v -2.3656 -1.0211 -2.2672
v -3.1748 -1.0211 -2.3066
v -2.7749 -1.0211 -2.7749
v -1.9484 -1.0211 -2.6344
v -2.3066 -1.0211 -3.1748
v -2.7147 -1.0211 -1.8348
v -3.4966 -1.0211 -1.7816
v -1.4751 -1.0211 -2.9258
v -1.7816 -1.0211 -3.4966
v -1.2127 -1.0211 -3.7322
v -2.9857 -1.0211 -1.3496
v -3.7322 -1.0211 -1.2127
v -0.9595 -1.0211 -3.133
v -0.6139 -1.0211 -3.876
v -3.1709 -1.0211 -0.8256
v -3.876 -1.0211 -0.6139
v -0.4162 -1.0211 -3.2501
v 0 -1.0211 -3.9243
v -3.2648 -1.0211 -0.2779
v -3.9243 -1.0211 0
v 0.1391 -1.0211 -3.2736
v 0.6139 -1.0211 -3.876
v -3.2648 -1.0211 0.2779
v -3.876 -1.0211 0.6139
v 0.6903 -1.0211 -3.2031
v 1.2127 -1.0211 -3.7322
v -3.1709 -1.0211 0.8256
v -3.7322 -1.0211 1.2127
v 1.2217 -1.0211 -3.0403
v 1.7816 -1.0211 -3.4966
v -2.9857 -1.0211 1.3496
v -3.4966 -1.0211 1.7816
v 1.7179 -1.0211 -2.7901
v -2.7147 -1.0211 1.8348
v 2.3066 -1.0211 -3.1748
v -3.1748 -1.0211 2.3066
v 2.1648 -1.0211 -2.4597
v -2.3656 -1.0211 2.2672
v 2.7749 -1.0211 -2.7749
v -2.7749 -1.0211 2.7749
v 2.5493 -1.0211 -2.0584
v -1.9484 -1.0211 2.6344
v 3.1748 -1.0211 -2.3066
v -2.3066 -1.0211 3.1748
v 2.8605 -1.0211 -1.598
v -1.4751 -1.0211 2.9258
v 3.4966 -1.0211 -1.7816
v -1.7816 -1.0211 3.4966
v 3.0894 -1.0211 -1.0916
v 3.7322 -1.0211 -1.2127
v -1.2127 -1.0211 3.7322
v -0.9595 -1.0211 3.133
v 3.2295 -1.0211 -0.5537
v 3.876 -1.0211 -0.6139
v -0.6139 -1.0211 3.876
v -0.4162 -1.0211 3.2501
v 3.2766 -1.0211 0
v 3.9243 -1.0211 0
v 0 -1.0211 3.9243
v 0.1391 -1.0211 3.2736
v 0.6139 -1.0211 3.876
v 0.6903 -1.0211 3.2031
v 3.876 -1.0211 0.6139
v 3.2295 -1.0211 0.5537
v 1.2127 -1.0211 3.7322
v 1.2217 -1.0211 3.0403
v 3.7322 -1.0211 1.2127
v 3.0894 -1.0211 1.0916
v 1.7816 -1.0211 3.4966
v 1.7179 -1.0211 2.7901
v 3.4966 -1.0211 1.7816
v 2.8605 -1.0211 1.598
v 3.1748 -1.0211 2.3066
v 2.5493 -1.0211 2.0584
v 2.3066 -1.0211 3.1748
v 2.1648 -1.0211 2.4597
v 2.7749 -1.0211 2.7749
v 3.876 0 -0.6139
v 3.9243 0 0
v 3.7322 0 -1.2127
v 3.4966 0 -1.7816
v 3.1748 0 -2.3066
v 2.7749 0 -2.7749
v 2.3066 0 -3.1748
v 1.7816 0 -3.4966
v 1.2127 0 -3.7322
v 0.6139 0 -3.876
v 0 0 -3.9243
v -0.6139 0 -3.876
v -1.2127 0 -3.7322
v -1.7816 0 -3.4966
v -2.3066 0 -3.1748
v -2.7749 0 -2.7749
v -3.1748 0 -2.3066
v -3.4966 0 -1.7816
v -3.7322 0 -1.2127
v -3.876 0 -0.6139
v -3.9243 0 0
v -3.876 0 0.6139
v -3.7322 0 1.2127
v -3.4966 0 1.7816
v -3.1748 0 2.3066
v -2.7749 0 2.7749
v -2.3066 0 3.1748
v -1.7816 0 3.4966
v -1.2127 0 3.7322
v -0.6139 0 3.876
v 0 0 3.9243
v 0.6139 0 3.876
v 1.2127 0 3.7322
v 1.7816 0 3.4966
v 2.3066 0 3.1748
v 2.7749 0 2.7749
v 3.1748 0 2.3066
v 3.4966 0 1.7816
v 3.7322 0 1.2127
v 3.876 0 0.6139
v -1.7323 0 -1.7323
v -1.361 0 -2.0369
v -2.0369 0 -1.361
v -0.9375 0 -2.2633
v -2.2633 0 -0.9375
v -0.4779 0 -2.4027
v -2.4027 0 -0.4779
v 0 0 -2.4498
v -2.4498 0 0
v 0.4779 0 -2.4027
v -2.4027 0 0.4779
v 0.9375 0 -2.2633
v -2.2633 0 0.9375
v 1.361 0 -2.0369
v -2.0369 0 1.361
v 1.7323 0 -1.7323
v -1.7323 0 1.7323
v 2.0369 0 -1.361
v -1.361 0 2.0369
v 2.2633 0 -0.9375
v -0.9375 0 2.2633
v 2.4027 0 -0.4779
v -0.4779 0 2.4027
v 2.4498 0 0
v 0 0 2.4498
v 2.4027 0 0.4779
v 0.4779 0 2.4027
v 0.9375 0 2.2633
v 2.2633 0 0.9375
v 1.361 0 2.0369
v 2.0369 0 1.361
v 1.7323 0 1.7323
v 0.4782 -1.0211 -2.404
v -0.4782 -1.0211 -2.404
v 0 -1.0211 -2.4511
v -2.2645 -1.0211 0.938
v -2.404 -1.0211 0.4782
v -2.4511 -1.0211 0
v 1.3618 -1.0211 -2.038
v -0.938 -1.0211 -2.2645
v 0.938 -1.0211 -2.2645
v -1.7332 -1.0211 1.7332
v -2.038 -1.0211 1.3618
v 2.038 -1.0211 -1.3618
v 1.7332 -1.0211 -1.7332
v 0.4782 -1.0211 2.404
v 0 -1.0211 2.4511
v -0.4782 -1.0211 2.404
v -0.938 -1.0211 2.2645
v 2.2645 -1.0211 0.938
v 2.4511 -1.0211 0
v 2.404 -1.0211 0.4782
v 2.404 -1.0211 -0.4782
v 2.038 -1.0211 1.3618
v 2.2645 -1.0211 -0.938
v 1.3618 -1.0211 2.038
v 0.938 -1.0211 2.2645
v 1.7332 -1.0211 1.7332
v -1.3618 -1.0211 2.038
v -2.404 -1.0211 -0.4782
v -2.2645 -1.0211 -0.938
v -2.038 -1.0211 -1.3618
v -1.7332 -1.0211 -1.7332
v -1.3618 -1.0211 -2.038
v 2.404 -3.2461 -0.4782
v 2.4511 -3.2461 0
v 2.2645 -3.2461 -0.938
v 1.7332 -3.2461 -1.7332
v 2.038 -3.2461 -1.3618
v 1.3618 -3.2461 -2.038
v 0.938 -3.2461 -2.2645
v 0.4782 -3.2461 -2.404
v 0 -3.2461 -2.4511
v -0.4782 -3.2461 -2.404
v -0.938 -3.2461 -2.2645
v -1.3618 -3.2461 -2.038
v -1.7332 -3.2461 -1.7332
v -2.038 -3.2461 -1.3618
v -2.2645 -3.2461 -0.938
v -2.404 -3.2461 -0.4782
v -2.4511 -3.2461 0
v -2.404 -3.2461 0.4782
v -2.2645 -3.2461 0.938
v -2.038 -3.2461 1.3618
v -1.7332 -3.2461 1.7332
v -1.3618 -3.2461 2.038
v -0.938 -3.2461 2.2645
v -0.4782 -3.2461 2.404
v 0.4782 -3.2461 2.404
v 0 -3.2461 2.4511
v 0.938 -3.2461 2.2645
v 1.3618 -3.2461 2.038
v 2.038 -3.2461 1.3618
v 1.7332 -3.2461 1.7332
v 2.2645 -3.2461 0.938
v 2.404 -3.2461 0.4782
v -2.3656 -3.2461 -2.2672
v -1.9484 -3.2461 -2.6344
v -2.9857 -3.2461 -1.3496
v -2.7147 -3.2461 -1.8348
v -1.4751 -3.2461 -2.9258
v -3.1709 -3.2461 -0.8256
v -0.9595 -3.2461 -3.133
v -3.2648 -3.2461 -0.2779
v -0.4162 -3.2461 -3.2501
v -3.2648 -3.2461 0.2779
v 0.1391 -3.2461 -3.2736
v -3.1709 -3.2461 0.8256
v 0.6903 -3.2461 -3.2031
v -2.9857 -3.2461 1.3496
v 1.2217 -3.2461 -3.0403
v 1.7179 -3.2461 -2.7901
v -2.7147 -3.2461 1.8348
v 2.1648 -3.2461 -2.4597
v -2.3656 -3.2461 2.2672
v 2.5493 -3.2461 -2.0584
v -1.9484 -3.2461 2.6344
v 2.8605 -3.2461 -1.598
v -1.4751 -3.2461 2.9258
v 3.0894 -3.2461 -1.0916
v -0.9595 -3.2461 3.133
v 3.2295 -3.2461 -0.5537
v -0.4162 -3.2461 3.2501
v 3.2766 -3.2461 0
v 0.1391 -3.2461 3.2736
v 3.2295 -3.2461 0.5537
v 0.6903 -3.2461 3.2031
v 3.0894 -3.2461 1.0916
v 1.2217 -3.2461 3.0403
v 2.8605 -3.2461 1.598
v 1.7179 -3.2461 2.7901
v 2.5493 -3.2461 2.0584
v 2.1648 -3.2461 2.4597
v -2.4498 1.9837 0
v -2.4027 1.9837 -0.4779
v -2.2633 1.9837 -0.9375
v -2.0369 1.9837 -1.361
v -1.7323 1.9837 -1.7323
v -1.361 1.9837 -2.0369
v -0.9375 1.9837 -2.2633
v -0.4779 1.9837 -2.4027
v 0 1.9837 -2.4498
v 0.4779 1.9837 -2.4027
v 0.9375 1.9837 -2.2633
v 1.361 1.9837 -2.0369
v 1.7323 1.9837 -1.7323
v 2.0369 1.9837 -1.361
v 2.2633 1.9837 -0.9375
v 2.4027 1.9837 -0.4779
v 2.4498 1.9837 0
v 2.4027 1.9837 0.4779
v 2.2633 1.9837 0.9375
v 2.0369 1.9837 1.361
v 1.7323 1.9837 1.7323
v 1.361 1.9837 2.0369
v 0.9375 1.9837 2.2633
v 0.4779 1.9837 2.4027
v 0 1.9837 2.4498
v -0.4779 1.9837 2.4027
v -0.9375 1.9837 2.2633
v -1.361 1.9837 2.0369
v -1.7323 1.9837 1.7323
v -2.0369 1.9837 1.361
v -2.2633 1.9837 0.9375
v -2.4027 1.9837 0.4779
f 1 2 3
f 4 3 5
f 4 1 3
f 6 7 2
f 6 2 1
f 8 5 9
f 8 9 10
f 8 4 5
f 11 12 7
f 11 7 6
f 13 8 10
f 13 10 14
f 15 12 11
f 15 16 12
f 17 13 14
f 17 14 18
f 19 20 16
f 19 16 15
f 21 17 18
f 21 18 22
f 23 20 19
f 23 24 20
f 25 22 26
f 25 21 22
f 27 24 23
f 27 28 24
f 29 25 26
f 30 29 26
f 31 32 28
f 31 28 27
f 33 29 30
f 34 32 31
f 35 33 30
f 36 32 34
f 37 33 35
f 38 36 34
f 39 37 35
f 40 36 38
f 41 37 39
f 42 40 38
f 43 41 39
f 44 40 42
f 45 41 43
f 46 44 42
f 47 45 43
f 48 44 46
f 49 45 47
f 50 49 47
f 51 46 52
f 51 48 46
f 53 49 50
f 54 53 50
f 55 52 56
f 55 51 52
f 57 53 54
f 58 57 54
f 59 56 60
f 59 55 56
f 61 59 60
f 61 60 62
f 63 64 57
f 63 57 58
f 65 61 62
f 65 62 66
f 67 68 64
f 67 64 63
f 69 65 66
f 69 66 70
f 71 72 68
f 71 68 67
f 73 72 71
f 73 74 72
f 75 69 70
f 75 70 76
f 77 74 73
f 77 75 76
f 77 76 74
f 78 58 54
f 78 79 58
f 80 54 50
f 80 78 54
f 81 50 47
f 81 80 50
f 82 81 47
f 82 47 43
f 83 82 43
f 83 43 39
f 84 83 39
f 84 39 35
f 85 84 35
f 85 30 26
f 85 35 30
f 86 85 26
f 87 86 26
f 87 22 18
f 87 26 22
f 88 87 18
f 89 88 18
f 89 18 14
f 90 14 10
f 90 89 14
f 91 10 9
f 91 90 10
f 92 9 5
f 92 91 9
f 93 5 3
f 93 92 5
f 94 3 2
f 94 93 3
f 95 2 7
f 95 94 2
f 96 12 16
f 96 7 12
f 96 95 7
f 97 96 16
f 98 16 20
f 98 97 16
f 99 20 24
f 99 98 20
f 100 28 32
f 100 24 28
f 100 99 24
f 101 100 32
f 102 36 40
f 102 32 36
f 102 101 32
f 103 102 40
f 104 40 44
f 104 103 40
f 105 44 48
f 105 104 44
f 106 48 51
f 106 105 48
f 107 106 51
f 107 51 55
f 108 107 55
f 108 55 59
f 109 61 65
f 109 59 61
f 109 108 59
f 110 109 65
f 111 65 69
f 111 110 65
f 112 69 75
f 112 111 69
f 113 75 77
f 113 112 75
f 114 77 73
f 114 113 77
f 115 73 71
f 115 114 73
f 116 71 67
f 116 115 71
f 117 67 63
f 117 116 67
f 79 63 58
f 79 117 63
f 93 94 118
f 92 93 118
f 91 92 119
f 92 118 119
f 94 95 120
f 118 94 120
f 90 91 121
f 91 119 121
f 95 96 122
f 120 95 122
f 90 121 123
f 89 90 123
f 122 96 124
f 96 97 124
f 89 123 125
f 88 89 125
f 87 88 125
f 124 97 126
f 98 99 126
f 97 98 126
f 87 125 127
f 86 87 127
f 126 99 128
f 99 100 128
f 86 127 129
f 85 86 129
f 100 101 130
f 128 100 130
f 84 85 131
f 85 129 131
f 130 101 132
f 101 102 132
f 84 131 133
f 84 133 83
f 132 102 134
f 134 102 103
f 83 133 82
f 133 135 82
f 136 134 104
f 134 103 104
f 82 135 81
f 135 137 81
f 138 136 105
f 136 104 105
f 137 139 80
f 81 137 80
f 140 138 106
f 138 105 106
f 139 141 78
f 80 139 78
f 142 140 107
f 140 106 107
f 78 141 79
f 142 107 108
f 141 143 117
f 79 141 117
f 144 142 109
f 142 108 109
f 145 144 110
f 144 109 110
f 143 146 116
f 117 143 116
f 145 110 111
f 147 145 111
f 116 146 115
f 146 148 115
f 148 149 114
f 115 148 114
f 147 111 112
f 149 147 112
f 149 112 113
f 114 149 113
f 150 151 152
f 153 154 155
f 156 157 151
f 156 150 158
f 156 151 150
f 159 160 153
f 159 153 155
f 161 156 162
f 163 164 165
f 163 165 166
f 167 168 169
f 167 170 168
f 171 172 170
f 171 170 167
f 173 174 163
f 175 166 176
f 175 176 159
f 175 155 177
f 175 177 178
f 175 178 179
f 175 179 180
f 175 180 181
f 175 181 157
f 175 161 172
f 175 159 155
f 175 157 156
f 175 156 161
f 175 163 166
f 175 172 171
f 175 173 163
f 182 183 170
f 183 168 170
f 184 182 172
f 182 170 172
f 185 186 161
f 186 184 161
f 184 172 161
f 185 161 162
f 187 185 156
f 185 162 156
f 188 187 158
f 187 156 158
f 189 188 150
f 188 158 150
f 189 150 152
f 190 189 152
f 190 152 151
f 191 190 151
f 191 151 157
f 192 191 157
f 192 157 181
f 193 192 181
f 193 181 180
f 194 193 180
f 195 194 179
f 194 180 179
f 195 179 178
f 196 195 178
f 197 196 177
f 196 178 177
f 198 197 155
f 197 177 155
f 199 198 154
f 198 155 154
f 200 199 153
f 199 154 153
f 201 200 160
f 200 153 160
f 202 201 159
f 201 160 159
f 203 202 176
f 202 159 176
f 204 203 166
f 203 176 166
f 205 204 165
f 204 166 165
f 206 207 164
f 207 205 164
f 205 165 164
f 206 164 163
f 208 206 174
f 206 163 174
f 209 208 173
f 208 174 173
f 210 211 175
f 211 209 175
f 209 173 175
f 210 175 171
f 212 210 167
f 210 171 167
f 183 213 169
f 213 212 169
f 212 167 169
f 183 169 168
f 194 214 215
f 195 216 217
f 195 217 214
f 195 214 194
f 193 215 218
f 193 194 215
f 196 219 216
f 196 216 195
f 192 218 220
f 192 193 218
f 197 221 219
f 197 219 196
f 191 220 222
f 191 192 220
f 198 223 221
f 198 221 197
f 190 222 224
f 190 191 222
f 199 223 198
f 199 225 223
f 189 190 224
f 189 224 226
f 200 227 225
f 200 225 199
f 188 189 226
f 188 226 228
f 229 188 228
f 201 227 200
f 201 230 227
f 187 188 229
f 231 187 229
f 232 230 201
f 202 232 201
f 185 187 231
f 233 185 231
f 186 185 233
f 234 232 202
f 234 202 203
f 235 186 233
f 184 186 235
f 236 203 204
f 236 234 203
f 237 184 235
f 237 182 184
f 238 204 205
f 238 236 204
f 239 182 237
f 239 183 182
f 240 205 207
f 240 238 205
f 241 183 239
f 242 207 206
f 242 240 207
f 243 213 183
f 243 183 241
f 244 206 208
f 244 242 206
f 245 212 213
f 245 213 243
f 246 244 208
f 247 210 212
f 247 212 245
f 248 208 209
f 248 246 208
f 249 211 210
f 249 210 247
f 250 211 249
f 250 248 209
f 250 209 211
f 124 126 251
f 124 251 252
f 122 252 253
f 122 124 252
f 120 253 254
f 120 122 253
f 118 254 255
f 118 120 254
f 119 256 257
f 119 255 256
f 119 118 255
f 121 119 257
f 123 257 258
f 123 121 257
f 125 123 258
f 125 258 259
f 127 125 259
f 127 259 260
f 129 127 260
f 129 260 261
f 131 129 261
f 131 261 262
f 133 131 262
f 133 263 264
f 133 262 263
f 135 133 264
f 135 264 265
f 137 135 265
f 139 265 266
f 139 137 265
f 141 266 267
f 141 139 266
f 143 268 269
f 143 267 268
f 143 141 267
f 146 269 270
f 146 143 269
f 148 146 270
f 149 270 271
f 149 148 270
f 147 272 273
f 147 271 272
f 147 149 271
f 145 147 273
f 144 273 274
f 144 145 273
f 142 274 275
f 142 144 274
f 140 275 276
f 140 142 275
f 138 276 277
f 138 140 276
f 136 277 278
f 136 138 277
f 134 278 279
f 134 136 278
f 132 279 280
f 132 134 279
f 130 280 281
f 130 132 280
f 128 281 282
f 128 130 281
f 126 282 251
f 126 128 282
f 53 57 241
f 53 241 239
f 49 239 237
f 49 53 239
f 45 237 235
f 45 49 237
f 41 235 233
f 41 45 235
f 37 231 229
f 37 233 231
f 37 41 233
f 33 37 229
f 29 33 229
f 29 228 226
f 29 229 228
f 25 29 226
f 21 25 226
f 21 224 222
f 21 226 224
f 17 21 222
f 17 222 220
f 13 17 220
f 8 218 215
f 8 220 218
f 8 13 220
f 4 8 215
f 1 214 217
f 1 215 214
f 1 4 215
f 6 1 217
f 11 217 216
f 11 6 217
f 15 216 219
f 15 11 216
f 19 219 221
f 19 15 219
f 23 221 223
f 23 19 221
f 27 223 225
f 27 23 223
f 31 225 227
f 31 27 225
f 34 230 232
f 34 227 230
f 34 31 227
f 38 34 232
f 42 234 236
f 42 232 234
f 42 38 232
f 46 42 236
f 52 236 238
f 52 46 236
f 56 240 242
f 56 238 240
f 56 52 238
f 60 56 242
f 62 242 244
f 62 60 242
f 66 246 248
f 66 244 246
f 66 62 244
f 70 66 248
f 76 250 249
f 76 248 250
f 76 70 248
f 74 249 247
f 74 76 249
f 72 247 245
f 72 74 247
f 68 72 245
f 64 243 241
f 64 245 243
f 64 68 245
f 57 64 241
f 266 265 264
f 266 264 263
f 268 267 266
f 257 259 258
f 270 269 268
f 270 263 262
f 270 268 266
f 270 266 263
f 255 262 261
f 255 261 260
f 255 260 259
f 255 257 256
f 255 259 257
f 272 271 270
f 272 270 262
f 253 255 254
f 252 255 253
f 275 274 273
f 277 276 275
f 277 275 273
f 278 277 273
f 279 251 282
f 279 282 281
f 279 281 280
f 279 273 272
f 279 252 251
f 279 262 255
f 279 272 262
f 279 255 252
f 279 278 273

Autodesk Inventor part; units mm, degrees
ref_plane "YZ Plane" through (0, 0, 0) normal (1, 0, 0) x (0, 1, 0)
ref_plane "XZ Plane" through (0, 0, 0) normal (0, 1, 0) x (-1, 0, 0)
ref_plane "XY Plane" through (0, 0, 0) normal (0, 0, 1) x (1, 0, 0)
sketch "Sketch1" plane through (0, 0, 0) normal (0, 1, 0) x (-1, 0, 0)
  circle A0 centre (0, 0) radius 2.4498
  circle A1 centre (0, 0) radius 3.2766
  circle A2 centre (0, 0) radius 3.8989
  dimension "d0" = 4.8997
  dimension "d1" = 6.5532
  dimension "d2" = 7.7978
extrude "Extrusion1" add sketch "Sketch1" along normal blind 1.9837 contours A0
sketch "Sketch2" plane through (0, 0, 0) normal (0, -1, 0) x (1, 0, 0)
  circle A0 centre (0, 0) radius 3.9243
  dimension "d5" = 7.8486
extrude "Extrusion2" add sketch "Sketch2" along normal blind 1.0211
sketch "Sketch3" plane through (0, -1.0211, 0) normal (0, -1, 0) x (1, 0, 0)
  circle A0 centre (0, 0) radius 3.2766
  circle A1 centre (0, 0) radius 2.4511
  dimension "d8" = 6.5532
  dimension "d9" = 4.9022
extrude "Extrusion3" add sketch "Sketch3" along normal blind 2.225
properties part number "1x1 circular almost looks like peg peg"
